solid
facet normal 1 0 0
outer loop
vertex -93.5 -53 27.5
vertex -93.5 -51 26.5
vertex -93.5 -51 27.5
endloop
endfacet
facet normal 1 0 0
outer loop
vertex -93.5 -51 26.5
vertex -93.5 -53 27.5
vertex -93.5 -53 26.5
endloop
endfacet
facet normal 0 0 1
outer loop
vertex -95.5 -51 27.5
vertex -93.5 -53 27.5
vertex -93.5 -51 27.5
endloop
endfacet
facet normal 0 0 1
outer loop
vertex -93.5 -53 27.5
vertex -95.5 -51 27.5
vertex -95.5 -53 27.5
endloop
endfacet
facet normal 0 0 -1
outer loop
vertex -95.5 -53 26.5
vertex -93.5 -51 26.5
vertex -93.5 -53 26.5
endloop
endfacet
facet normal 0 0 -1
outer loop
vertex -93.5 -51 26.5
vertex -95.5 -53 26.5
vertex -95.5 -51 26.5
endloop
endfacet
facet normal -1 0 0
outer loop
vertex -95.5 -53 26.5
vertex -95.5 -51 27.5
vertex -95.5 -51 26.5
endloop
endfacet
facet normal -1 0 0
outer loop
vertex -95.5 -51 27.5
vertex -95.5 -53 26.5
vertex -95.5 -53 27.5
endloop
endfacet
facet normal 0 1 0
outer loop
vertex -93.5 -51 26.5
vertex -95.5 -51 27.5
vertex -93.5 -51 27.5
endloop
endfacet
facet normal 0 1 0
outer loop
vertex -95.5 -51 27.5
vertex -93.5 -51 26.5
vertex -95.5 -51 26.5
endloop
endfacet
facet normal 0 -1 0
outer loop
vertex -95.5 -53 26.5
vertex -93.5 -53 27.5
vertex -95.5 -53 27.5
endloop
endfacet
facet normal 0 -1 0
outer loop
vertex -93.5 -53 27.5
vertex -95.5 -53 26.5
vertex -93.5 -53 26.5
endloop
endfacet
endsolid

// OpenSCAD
// Y-servo lead post on the X base's -X end: there must be material at the
// top of the post (the bridge the lead is tied to). Non-empty.
include <../axes.scad>
intersection() {
  x_base();
  translate([lead_post_x - 1, lead_post_y - 1, lead_post_top - 1.5]) cube([2, 2, 1]);
}
